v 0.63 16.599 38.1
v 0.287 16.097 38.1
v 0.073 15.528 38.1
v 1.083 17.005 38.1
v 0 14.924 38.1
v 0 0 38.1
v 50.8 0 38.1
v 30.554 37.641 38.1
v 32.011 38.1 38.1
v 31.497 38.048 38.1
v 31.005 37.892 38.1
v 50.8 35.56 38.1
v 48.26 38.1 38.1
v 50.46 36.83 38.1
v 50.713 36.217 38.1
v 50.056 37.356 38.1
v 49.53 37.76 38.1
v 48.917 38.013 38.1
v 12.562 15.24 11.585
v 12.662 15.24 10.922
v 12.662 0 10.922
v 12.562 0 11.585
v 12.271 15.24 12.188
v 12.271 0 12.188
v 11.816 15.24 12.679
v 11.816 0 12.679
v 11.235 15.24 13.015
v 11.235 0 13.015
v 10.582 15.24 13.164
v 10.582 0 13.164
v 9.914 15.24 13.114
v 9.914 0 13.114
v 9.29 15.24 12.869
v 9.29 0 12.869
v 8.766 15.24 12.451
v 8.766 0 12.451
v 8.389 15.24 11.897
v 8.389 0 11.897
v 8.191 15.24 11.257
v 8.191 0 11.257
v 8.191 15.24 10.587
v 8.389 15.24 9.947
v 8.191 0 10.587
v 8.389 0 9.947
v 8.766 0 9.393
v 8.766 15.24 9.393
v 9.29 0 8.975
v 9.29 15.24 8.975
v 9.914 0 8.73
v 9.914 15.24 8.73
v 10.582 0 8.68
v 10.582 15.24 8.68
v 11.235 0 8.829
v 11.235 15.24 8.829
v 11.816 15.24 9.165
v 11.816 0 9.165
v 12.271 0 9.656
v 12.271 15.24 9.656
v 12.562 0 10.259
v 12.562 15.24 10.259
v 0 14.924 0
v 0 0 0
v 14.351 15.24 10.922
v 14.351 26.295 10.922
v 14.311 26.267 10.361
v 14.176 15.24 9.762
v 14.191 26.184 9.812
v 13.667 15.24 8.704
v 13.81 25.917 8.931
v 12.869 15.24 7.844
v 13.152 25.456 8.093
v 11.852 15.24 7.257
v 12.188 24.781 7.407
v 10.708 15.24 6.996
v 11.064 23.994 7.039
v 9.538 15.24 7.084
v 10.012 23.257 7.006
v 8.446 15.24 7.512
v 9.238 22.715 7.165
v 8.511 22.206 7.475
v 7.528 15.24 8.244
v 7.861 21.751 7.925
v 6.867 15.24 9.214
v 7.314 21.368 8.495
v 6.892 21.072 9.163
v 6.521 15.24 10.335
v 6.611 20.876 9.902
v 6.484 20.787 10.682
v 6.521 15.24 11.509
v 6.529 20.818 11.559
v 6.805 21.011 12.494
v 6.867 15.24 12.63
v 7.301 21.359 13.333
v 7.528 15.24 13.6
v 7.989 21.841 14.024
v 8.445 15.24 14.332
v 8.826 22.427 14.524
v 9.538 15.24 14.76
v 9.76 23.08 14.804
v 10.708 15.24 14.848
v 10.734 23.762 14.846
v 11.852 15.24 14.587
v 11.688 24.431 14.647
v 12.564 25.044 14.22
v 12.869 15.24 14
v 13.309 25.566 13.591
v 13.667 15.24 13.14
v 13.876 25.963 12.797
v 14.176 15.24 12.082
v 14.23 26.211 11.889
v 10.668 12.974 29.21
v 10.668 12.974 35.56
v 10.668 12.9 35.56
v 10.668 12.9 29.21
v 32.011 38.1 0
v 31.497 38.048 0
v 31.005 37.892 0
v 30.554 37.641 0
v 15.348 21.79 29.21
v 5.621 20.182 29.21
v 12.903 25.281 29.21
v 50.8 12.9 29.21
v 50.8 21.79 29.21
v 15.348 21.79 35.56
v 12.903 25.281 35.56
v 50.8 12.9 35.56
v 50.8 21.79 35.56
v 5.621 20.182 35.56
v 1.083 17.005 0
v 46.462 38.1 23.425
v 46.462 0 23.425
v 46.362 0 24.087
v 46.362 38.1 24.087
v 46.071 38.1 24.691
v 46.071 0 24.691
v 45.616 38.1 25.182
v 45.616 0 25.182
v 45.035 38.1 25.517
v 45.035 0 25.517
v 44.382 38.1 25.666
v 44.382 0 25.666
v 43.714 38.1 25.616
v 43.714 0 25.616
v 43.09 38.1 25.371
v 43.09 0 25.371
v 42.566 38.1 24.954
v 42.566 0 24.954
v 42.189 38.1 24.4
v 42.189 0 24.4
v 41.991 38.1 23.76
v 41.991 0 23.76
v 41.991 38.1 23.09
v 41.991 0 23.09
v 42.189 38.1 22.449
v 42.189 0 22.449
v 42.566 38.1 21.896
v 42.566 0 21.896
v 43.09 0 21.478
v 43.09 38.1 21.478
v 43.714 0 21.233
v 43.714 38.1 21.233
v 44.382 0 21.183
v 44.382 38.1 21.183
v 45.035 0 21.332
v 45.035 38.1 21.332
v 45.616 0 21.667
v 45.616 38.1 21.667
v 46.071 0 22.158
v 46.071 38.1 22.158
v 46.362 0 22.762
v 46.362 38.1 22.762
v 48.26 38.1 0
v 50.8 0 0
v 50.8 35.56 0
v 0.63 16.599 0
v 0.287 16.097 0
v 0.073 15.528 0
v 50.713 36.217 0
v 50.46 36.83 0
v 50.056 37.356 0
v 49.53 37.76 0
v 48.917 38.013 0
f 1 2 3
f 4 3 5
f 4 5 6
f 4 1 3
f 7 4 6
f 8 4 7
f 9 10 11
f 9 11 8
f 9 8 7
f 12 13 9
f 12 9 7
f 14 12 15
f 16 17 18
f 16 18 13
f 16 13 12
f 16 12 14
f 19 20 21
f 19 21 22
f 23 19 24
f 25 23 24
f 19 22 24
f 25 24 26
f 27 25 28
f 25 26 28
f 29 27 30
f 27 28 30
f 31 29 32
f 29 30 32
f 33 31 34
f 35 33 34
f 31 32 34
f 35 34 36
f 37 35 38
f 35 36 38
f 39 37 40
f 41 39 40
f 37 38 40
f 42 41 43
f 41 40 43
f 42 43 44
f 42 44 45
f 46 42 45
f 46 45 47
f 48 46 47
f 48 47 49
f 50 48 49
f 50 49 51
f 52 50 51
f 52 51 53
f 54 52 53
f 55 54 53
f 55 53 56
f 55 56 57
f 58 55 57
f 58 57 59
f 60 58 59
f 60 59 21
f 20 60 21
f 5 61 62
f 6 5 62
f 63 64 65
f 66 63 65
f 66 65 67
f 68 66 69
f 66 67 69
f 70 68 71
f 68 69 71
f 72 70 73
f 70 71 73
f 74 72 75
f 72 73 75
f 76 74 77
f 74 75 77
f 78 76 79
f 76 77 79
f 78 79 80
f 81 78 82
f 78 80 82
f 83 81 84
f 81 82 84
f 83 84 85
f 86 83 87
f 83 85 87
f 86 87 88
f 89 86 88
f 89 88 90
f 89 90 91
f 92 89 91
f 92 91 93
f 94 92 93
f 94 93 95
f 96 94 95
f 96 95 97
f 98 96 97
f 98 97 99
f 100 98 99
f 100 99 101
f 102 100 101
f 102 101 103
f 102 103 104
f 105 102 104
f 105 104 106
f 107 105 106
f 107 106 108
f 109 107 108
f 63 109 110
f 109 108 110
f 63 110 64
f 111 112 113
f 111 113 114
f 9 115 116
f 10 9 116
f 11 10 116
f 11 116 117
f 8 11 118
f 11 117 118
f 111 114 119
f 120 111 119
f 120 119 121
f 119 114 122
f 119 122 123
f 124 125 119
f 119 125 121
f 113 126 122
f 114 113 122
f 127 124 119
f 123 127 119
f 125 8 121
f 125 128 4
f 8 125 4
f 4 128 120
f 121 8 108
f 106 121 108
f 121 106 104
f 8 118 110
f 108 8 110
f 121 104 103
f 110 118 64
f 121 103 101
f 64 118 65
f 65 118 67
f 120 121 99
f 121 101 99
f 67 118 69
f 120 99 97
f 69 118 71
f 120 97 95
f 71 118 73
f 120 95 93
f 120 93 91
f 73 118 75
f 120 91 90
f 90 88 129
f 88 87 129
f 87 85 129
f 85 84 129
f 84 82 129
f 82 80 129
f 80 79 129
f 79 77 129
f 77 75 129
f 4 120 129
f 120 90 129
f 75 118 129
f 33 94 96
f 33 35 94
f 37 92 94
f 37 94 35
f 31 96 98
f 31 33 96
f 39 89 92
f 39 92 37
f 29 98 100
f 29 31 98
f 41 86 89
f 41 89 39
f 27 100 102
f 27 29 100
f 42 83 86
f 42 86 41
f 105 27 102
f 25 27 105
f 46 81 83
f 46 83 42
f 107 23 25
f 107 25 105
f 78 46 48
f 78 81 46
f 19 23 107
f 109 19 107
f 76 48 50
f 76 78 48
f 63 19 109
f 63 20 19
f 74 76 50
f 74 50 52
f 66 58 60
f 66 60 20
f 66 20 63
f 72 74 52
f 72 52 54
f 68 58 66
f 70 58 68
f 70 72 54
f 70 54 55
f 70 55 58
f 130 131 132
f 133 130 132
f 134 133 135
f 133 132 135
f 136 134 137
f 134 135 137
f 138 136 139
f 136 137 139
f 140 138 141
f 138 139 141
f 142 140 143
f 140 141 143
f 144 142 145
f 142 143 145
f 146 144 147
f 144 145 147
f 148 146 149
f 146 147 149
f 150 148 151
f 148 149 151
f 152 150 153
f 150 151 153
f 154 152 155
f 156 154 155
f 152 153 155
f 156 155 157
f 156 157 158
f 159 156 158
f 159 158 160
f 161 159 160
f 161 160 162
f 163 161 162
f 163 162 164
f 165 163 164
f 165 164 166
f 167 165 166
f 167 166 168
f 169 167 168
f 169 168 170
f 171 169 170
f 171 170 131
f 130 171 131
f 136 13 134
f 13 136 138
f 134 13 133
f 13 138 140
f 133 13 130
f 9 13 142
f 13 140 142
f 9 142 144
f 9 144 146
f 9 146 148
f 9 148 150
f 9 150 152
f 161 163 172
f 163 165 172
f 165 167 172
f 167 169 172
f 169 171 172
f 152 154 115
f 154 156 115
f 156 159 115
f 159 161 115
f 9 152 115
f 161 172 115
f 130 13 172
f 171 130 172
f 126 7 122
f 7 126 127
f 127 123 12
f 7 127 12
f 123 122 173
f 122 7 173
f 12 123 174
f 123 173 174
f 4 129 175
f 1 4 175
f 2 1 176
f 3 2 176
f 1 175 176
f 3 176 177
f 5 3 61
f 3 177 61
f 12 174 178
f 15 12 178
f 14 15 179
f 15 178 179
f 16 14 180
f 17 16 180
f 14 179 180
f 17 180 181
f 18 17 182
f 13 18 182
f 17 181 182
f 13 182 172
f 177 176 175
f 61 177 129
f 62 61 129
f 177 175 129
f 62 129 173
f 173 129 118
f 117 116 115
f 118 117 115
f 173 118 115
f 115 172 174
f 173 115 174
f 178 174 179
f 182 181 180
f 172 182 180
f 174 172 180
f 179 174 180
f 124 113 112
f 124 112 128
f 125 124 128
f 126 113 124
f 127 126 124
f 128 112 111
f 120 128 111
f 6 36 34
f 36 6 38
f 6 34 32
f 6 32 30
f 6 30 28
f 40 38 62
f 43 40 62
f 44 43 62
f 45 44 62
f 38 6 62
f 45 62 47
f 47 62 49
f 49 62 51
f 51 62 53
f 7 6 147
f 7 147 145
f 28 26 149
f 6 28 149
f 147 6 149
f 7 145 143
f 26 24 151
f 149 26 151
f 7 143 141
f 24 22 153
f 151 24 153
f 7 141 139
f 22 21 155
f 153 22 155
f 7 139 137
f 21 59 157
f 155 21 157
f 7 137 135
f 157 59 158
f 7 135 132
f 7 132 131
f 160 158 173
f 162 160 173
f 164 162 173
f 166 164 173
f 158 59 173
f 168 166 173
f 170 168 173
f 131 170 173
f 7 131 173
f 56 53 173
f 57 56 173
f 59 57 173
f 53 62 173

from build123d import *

# Parameters (mm, degrees)
BOSS_EXTRUDE1_DEPTH = 38.1
SKETCH4_W           = 8.89
SKETCH4_H           = 6.35
CUT_EXTRUDE1_DEPTH  = 8.89
SKETCH5_W           = 6.35
SKETCH5_H           = 8.89
CUT_EXTRUDE2_DEPTH  = 40.132
SKETCH6_R           = 2.2479
CUT_EXTRUDE3_DEPTH  = 74.93
CUT_EXTRUDE8_START  = -11.43
SKETCH10_R          = 3.937
CUT_EXTRUDE8_DEPTH  = 11.43


with BuildPart() as part:
    # Sketch1 → Boss-Extrude1 (new body)
    with BuildSketch(Plane.XY):
        with BuildLine():
            Line((0, 0), (50.8, 0))
            Line((50.8, 0), (50.8, 35.56))
            ThreePointArc((50.8, 35.56), (50.056051224, 37.356051224), (48.26, 38.1))
            Line((48.26, 38.1), (32.010551811, 38.1))
            ThreePointArc((32.010551811, 38.1), (31.24675908, 37.982441055), (30.553667663, 37.640646192))
            Line((30.553667663, 37.640646192), (1.083115852, 17.005143659))
            ThreePointArc((1.083115852, 17.005143659), (0.286992484, 16.097338944), (0, 14.924497467))
            Line((0, 14.924497467), (0, 0))
        make_face()
    extrude(amount=BOSS_EXTRUDE1_DEPTH)

    # Sketch4 → Cut-Extrude1 (cut)
    with BuildSketch(Plane(origin=(-7.6334698, 10.901724679, 0), x_dir=(0.819152044, 0.573576436, 0), z_dir=(-0.573576436, 0.819152044, 0))):
        with Locations((20.625340071, -32.385)):
            Rectangle(SKETCH4_W, SKETCH4_H)
    extrude(amount=-CUT_EXTRUDE1_DEPTH, mode=Mode.SUBTRACT)

    # Sketch5 → Cut-Extrude2 (cut)
    with BuildSketch(Plane(origin=(50.8, 0, 0), x_dir=(0, 0, -1), z_dir=(1, 0, 0))):
        with Locations((-32.385, 17.345124802)):
            Rectangle(SKETCH5_W, SKETCH5_H)
    extrude(amount=-CUT_EXTRUDE2_DEPTH, mode=Mode.SUBTRACT)

    # Sketch6 → Cut-Extrude3 (cut)
    with BuildSketch(Plane.XZ):
        with Locations((44.214054574, 23.424710834)):
            Circle(SKETCH6_R)
        with Locations((10.414, 10.922)):
            Circle(SKETCH6_R)
    extrude(amount=-CUT_EXTRUDE3_DEPTH, mode=Mode.SUBTRACT)

    # Sketch10 → Cut-Extrude8 (cut)
    with BuildSketch(Plane(origin=(0, 38.1, 0), x_dir=(1, 0, 0), z_dir=(0, 1, 0)).offset(CUT_EXTRUDE8_START)):
        with Locations((10.414, -10.922)):
            Circle(SKETCH10_R)
    extrude(amount=-CUT_EXTRUDE8_DEPTH, mode=Mode.SUBTRACT)


solid = part.part
